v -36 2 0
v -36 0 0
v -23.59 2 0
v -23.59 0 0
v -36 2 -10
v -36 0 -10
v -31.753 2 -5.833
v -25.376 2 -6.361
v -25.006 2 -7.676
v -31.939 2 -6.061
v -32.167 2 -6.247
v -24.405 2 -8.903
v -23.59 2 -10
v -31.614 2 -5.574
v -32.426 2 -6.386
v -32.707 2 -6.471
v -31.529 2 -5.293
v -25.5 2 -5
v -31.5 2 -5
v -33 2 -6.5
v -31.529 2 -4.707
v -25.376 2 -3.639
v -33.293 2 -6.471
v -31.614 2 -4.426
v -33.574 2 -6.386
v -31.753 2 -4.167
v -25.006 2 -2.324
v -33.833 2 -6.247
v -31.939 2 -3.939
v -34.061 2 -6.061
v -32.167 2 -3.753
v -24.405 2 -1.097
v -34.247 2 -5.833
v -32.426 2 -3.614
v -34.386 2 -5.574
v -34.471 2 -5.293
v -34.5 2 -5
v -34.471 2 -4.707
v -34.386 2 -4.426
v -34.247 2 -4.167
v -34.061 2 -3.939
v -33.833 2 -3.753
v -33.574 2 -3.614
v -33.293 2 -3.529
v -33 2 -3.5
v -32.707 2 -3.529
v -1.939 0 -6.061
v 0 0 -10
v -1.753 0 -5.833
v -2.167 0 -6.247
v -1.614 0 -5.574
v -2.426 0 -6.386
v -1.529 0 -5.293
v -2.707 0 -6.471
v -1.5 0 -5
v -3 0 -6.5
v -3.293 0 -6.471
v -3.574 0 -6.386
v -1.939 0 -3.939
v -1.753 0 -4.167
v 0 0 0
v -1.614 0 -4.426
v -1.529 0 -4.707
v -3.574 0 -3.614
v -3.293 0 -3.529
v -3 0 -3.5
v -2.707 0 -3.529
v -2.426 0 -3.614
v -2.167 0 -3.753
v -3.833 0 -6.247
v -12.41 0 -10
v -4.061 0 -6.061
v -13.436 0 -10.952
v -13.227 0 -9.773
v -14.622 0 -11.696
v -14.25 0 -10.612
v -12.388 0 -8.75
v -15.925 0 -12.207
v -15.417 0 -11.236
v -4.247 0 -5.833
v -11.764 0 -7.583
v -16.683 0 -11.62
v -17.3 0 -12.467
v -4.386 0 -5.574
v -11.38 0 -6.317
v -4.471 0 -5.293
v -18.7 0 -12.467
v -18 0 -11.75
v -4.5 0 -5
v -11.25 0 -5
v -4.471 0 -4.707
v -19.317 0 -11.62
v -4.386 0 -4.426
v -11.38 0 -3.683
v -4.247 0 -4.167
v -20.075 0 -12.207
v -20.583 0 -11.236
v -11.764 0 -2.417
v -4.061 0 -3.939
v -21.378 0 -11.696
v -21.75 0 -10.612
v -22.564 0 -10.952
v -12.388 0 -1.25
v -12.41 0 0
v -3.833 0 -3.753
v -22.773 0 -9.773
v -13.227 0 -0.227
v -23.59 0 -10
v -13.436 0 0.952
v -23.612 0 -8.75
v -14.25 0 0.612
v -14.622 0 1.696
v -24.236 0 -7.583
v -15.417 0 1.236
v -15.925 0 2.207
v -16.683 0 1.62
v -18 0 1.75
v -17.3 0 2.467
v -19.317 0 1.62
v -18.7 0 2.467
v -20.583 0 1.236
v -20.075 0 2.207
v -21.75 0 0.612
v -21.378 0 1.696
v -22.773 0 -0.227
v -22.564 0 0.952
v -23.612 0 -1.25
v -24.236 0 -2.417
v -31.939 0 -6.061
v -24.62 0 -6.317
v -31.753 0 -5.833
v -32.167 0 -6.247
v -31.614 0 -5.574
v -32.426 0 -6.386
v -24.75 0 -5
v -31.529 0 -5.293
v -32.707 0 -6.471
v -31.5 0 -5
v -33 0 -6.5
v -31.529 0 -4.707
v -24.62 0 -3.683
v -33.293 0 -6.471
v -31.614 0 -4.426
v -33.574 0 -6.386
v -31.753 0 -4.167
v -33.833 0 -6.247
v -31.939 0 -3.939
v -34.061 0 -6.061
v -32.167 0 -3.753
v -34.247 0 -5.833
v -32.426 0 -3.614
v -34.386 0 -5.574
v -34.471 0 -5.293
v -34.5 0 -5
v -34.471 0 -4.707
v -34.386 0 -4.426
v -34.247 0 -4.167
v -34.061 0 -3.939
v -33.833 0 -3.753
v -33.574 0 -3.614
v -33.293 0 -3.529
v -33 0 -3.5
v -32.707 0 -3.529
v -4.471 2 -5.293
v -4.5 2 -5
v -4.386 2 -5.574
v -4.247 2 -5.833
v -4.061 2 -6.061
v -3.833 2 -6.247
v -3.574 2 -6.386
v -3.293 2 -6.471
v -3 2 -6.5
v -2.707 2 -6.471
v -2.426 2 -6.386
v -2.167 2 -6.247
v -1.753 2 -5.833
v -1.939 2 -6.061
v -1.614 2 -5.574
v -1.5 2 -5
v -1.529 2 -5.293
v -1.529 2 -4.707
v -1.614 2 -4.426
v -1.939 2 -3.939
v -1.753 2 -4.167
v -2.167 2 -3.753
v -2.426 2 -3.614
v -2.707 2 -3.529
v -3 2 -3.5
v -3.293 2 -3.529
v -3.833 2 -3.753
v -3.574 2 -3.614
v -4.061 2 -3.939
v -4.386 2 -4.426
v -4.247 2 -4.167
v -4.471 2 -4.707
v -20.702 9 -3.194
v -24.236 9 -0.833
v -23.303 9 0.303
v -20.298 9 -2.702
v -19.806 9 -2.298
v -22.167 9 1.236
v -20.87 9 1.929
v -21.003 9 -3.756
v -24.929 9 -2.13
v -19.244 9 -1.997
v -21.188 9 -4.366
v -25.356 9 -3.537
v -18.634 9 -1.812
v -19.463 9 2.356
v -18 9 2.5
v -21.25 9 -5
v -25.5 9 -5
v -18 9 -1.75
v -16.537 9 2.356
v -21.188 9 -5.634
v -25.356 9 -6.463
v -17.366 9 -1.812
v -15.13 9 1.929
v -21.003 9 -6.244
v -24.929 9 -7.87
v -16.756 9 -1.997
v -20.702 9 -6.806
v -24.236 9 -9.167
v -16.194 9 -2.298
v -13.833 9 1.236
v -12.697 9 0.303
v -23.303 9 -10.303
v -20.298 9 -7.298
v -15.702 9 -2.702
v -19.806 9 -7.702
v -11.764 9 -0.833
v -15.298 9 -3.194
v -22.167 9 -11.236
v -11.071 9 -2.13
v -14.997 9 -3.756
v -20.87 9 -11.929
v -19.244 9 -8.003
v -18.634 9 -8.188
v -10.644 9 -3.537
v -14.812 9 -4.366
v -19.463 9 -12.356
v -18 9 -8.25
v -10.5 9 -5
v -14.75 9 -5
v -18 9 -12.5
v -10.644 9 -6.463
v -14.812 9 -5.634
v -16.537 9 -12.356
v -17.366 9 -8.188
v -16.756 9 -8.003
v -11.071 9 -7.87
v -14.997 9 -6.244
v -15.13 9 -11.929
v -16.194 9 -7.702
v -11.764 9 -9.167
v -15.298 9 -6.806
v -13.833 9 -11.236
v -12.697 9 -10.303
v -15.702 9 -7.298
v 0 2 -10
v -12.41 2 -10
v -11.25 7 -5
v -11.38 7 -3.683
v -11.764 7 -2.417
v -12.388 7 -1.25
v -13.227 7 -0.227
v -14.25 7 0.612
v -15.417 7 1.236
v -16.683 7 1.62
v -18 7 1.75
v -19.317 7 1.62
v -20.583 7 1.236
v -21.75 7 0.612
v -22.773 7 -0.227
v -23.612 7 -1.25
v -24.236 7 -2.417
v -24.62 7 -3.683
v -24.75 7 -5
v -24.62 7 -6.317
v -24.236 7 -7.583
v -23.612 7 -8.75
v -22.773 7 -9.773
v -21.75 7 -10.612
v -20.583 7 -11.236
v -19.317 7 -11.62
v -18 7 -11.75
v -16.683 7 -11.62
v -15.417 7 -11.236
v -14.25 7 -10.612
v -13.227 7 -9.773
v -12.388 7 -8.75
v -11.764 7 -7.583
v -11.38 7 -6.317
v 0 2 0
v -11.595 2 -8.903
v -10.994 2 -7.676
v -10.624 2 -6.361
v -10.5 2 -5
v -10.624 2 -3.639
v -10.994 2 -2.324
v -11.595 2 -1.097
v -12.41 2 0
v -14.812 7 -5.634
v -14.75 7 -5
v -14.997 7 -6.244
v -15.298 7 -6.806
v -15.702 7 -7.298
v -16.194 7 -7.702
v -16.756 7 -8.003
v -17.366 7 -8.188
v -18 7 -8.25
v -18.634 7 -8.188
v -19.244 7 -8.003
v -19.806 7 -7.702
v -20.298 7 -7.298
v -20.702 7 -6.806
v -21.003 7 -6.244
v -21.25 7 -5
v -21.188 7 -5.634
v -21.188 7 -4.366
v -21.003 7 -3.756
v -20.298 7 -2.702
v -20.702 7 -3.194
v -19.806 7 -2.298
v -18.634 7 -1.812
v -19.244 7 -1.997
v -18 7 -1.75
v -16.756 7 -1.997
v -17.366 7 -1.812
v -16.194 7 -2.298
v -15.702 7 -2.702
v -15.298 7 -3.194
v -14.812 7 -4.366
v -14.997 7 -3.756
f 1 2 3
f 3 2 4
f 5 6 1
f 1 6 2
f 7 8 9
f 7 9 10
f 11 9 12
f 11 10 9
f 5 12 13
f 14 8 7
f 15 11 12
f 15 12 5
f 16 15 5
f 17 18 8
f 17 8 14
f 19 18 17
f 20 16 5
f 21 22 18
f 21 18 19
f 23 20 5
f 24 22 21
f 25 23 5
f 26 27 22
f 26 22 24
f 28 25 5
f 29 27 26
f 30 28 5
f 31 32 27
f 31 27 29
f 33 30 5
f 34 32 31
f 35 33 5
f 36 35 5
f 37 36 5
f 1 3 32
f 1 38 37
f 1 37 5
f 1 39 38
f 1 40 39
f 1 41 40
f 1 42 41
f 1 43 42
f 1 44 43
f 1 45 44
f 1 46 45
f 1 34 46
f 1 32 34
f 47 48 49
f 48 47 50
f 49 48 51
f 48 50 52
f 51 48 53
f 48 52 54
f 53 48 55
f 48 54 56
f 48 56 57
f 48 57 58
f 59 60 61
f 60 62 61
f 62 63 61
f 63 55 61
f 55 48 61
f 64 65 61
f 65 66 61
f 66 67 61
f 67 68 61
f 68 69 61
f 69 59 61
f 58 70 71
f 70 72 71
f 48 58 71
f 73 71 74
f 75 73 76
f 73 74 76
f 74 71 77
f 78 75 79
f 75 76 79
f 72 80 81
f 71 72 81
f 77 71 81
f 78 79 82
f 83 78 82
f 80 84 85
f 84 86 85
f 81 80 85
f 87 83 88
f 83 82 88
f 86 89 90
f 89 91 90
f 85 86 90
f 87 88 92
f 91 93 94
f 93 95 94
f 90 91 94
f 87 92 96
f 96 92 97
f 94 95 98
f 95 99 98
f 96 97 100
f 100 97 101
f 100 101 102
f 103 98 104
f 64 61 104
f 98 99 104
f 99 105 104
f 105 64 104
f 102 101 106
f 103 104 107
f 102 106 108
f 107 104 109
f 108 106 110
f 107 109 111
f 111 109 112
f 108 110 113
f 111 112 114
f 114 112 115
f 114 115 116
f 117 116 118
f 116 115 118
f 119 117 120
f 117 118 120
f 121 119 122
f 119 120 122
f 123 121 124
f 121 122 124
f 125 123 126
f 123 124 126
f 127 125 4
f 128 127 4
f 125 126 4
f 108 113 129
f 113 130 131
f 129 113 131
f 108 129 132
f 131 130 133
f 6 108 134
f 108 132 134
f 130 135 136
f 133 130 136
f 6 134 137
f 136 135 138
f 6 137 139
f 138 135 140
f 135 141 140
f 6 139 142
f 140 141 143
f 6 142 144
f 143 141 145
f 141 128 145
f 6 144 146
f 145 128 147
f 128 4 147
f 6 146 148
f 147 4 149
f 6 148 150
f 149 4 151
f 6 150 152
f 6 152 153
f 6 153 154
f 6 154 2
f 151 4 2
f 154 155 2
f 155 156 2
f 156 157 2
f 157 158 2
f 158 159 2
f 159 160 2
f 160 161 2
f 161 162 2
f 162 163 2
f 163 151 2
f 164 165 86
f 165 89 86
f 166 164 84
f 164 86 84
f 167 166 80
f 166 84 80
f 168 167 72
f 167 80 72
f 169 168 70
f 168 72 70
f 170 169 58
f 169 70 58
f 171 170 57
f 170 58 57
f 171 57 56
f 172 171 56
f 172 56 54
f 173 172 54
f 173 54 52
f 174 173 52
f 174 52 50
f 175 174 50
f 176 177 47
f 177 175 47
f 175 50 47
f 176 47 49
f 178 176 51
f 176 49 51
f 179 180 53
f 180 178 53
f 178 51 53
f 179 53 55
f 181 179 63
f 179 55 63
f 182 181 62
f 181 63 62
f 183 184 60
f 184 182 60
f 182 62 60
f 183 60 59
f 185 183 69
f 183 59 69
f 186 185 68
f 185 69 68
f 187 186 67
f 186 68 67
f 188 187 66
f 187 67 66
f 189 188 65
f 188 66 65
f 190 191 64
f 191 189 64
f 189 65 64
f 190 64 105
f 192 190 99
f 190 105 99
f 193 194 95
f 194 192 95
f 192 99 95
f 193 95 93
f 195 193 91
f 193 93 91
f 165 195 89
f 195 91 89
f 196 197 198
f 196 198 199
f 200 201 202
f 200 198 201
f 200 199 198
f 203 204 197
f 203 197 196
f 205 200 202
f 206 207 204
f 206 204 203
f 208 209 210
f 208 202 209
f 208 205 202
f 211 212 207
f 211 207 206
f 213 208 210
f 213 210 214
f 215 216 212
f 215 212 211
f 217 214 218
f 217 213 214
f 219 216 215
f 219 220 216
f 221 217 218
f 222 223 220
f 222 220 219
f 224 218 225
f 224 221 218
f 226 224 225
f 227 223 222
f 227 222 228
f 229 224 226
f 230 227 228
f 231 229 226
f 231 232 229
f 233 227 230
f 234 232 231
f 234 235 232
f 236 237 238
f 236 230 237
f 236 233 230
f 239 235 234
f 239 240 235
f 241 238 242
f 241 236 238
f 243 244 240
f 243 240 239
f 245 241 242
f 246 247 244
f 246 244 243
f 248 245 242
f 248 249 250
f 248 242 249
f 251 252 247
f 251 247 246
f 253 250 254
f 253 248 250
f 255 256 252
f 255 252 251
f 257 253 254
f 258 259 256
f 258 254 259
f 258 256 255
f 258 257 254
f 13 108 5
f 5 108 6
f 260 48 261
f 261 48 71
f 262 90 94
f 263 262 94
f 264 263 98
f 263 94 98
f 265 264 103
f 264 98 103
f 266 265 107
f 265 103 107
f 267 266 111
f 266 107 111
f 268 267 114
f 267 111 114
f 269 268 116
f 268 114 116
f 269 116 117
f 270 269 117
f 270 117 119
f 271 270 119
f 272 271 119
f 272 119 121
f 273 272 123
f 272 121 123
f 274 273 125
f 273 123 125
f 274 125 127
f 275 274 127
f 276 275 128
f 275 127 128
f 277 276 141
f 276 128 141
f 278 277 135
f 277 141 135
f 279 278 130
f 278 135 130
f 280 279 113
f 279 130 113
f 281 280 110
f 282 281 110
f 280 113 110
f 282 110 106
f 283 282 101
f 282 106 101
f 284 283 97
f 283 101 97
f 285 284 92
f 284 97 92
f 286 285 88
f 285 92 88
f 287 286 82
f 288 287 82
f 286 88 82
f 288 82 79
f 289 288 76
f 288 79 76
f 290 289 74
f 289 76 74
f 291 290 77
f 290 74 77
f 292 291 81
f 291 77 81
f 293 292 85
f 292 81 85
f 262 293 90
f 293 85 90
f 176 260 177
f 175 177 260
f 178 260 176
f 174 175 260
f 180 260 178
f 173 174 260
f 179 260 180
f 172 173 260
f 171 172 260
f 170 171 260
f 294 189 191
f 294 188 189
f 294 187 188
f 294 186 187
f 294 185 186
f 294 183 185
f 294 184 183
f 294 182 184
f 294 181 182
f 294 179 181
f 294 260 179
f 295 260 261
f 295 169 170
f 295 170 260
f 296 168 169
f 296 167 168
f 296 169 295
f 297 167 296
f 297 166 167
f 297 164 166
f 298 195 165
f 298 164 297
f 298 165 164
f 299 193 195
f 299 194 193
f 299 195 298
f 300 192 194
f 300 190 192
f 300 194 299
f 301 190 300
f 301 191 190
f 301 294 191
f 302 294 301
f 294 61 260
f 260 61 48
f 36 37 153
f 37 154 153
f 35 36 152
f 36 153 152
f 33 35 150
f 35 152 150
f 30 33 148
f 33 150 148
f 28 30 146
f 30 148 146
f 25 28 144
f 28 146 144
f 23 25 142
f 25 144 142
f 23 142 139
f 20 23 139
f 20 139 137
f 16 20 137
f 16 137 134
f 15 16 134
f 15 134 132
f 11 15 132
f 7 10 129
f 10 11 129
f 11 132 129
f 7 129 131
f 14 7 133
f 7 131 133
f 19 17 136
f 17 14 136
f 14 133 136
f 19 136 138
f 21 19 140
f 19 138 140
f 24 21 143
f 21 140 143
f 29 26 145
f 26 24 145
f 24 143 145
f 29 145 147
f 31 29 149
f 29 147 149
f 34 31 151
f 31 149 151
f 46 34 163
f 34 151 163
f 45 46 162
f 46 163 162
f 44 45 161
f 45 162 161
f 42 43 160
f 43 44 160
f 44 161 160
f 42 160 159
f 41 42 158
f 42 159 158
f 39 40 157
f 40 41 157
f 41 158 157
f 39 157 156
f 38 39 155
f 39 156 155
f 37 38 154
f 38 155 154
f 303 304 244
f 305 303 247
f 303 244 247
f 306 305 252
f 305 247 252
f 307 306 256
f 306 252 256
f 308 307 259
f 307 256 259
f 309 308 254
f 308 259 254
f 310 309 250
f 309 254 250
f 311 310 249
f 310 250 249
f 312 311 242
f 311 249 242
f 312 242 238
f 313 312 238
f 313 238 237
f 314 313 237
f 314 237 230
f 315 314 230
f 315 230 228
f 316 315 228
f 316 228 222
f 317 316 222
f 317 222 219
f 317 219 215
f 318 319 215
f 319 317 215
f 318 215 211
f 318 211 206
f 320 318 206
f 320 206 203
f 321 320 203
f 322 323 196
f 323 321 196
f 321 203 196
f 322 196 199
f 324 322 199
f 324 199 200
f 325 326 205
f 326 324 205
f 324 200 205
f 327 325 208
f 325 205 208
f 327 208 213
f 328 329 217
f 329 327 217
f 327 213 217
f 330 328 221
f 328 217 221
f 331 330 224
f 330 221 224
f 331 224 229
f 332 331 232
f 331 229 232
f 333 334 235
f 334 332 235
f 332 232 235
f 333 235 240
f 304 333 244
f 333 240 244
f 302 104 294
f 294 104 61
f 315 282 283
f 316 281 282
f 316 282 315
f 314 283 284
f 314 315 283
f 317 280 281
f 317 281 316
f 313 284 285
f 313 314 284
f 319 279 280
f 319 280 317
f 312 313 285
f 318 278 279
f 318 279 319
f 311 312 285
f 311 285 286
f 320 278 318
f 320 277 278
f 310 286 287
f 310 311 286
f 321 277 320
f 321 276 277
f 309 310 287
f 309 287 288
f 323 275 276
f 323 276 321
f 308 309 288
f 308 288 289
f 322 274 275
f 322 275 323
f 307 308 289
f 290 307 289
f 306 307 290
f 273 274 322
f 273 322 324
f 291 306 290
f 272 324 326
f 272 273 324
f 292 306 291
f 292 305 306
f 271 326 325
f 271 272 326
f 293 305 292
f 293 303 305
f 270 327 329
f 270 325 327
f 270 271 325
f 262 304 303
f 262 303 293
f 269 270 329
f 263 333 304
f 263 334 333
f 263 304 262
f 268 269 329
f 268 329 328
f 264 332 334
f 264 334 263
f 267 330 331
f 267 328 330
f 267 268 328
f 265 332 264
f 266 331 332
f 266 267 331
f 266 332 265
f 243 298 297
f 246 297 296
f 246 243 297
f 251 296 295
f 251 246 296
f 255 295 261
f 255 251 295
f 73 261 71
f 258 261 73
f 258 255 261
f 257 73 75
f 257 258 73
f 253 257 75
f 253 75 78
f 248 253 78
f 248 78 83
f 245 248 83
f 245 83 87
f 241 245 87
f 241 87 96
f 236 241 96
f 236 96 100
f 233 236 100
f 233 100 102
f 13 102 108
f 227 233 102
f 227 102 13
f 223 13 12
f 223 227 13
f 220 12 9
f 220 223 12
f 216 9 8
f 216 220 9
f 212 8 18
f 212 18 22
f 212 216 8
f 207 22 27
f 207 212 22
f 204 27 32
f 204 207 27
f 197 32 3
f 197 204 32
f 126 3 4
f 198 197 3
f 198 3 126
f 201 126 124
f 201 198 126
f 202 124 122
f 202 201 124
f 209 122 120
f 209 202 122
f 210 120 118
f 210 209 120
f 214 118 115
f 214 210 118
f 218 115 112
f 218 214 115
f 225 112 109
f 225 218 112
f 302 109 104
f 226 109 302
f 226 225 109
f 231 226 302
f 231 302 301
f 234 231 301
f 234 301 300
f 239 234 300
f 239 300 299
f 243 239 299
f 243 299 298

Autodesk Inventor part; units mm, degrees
ref_plane "YZ Plane" through (0, 0, 0) normal (1, 0, 0) x (0, 1, 0)
ref_plane "XZ Plane" through (0, 0, 0) normal (0, 1, 0) x (-1, 0, 0)
ref_plane "XY Plane" through (0, 0, 0) normal (0, 0, 1) x (1, 0, 0)
sketch "Sketch1" plane through (0, 0, 0) normal (0, 1, 0) x (-1, 0, 0)
  line L0 (0, 0) -> (0, -10)
  line L1 (0, -10) -> (36, -10)
  line L2 (36, -10) -> (36, 0)
  line L3 (36, 0) -> (0, 0)
  circle A0 centre (33, -5) radius 1.5
  circle A1 centre (3, -5) radius 1.5
  dimension "d0" = 10
  dimension "d1" = 36
extrude "Extrusion1" add sketch "Sketch1" along normal blind 2
sketch "Sketch2" plane through (0, 2, 0) normal (0, 1, 0) x (1, 0, 0)
  line L0 (-36, 0) -> (0, 0) projected
  line L1 (-18, 0) -> (-18, 10)
  line L2 (0, 10) -> (-36, 10) projected
  circle A0 centre (-18, 5) radius 7.5
  dimension "d6" = 15
extrude "Extrusion2" add sketch "Sketch2" along normal blind 7
sketch "Sketch5" plane through (0, 2, 0) normal (0, -1, 0) x (1, 0, 0)
  arc A0 (-13.4654, 0) -> (-22.5346, 0) centre (-18, -5) ccw projected
  circle A1 centre (-18, -5) radius 7.5
  point P0 (0, 0)
extrude "Extrusion5" add sketch "Sketch5" along normal blind 2
sketch "Sketch8" plane through (-18, 9, -5) normal (0, 1, 0) x (1, 0, 0)
  circle A0 centre (0, 0) radius 3.25
  point P0 (18, -5)
  dimension "d19" = 6.5
extrude "Extrusion7" cut sketch "Sketch8" against normal up to next
sketch "Sketch9" plane through (0, 0, 0) normal (0, -1, 0) x (1, 0, 0)
  circle A0 centre (-18, -5) radius 3.25 projected
  circle A1 centre (-18, -5) radius 6.75
  point P0 (0, 0)
  dimension "d22" = 13.5
extrude "Extrusion8" cut sketch "Sketch9" against normal blind 7
properties part number "LED_mount2"
